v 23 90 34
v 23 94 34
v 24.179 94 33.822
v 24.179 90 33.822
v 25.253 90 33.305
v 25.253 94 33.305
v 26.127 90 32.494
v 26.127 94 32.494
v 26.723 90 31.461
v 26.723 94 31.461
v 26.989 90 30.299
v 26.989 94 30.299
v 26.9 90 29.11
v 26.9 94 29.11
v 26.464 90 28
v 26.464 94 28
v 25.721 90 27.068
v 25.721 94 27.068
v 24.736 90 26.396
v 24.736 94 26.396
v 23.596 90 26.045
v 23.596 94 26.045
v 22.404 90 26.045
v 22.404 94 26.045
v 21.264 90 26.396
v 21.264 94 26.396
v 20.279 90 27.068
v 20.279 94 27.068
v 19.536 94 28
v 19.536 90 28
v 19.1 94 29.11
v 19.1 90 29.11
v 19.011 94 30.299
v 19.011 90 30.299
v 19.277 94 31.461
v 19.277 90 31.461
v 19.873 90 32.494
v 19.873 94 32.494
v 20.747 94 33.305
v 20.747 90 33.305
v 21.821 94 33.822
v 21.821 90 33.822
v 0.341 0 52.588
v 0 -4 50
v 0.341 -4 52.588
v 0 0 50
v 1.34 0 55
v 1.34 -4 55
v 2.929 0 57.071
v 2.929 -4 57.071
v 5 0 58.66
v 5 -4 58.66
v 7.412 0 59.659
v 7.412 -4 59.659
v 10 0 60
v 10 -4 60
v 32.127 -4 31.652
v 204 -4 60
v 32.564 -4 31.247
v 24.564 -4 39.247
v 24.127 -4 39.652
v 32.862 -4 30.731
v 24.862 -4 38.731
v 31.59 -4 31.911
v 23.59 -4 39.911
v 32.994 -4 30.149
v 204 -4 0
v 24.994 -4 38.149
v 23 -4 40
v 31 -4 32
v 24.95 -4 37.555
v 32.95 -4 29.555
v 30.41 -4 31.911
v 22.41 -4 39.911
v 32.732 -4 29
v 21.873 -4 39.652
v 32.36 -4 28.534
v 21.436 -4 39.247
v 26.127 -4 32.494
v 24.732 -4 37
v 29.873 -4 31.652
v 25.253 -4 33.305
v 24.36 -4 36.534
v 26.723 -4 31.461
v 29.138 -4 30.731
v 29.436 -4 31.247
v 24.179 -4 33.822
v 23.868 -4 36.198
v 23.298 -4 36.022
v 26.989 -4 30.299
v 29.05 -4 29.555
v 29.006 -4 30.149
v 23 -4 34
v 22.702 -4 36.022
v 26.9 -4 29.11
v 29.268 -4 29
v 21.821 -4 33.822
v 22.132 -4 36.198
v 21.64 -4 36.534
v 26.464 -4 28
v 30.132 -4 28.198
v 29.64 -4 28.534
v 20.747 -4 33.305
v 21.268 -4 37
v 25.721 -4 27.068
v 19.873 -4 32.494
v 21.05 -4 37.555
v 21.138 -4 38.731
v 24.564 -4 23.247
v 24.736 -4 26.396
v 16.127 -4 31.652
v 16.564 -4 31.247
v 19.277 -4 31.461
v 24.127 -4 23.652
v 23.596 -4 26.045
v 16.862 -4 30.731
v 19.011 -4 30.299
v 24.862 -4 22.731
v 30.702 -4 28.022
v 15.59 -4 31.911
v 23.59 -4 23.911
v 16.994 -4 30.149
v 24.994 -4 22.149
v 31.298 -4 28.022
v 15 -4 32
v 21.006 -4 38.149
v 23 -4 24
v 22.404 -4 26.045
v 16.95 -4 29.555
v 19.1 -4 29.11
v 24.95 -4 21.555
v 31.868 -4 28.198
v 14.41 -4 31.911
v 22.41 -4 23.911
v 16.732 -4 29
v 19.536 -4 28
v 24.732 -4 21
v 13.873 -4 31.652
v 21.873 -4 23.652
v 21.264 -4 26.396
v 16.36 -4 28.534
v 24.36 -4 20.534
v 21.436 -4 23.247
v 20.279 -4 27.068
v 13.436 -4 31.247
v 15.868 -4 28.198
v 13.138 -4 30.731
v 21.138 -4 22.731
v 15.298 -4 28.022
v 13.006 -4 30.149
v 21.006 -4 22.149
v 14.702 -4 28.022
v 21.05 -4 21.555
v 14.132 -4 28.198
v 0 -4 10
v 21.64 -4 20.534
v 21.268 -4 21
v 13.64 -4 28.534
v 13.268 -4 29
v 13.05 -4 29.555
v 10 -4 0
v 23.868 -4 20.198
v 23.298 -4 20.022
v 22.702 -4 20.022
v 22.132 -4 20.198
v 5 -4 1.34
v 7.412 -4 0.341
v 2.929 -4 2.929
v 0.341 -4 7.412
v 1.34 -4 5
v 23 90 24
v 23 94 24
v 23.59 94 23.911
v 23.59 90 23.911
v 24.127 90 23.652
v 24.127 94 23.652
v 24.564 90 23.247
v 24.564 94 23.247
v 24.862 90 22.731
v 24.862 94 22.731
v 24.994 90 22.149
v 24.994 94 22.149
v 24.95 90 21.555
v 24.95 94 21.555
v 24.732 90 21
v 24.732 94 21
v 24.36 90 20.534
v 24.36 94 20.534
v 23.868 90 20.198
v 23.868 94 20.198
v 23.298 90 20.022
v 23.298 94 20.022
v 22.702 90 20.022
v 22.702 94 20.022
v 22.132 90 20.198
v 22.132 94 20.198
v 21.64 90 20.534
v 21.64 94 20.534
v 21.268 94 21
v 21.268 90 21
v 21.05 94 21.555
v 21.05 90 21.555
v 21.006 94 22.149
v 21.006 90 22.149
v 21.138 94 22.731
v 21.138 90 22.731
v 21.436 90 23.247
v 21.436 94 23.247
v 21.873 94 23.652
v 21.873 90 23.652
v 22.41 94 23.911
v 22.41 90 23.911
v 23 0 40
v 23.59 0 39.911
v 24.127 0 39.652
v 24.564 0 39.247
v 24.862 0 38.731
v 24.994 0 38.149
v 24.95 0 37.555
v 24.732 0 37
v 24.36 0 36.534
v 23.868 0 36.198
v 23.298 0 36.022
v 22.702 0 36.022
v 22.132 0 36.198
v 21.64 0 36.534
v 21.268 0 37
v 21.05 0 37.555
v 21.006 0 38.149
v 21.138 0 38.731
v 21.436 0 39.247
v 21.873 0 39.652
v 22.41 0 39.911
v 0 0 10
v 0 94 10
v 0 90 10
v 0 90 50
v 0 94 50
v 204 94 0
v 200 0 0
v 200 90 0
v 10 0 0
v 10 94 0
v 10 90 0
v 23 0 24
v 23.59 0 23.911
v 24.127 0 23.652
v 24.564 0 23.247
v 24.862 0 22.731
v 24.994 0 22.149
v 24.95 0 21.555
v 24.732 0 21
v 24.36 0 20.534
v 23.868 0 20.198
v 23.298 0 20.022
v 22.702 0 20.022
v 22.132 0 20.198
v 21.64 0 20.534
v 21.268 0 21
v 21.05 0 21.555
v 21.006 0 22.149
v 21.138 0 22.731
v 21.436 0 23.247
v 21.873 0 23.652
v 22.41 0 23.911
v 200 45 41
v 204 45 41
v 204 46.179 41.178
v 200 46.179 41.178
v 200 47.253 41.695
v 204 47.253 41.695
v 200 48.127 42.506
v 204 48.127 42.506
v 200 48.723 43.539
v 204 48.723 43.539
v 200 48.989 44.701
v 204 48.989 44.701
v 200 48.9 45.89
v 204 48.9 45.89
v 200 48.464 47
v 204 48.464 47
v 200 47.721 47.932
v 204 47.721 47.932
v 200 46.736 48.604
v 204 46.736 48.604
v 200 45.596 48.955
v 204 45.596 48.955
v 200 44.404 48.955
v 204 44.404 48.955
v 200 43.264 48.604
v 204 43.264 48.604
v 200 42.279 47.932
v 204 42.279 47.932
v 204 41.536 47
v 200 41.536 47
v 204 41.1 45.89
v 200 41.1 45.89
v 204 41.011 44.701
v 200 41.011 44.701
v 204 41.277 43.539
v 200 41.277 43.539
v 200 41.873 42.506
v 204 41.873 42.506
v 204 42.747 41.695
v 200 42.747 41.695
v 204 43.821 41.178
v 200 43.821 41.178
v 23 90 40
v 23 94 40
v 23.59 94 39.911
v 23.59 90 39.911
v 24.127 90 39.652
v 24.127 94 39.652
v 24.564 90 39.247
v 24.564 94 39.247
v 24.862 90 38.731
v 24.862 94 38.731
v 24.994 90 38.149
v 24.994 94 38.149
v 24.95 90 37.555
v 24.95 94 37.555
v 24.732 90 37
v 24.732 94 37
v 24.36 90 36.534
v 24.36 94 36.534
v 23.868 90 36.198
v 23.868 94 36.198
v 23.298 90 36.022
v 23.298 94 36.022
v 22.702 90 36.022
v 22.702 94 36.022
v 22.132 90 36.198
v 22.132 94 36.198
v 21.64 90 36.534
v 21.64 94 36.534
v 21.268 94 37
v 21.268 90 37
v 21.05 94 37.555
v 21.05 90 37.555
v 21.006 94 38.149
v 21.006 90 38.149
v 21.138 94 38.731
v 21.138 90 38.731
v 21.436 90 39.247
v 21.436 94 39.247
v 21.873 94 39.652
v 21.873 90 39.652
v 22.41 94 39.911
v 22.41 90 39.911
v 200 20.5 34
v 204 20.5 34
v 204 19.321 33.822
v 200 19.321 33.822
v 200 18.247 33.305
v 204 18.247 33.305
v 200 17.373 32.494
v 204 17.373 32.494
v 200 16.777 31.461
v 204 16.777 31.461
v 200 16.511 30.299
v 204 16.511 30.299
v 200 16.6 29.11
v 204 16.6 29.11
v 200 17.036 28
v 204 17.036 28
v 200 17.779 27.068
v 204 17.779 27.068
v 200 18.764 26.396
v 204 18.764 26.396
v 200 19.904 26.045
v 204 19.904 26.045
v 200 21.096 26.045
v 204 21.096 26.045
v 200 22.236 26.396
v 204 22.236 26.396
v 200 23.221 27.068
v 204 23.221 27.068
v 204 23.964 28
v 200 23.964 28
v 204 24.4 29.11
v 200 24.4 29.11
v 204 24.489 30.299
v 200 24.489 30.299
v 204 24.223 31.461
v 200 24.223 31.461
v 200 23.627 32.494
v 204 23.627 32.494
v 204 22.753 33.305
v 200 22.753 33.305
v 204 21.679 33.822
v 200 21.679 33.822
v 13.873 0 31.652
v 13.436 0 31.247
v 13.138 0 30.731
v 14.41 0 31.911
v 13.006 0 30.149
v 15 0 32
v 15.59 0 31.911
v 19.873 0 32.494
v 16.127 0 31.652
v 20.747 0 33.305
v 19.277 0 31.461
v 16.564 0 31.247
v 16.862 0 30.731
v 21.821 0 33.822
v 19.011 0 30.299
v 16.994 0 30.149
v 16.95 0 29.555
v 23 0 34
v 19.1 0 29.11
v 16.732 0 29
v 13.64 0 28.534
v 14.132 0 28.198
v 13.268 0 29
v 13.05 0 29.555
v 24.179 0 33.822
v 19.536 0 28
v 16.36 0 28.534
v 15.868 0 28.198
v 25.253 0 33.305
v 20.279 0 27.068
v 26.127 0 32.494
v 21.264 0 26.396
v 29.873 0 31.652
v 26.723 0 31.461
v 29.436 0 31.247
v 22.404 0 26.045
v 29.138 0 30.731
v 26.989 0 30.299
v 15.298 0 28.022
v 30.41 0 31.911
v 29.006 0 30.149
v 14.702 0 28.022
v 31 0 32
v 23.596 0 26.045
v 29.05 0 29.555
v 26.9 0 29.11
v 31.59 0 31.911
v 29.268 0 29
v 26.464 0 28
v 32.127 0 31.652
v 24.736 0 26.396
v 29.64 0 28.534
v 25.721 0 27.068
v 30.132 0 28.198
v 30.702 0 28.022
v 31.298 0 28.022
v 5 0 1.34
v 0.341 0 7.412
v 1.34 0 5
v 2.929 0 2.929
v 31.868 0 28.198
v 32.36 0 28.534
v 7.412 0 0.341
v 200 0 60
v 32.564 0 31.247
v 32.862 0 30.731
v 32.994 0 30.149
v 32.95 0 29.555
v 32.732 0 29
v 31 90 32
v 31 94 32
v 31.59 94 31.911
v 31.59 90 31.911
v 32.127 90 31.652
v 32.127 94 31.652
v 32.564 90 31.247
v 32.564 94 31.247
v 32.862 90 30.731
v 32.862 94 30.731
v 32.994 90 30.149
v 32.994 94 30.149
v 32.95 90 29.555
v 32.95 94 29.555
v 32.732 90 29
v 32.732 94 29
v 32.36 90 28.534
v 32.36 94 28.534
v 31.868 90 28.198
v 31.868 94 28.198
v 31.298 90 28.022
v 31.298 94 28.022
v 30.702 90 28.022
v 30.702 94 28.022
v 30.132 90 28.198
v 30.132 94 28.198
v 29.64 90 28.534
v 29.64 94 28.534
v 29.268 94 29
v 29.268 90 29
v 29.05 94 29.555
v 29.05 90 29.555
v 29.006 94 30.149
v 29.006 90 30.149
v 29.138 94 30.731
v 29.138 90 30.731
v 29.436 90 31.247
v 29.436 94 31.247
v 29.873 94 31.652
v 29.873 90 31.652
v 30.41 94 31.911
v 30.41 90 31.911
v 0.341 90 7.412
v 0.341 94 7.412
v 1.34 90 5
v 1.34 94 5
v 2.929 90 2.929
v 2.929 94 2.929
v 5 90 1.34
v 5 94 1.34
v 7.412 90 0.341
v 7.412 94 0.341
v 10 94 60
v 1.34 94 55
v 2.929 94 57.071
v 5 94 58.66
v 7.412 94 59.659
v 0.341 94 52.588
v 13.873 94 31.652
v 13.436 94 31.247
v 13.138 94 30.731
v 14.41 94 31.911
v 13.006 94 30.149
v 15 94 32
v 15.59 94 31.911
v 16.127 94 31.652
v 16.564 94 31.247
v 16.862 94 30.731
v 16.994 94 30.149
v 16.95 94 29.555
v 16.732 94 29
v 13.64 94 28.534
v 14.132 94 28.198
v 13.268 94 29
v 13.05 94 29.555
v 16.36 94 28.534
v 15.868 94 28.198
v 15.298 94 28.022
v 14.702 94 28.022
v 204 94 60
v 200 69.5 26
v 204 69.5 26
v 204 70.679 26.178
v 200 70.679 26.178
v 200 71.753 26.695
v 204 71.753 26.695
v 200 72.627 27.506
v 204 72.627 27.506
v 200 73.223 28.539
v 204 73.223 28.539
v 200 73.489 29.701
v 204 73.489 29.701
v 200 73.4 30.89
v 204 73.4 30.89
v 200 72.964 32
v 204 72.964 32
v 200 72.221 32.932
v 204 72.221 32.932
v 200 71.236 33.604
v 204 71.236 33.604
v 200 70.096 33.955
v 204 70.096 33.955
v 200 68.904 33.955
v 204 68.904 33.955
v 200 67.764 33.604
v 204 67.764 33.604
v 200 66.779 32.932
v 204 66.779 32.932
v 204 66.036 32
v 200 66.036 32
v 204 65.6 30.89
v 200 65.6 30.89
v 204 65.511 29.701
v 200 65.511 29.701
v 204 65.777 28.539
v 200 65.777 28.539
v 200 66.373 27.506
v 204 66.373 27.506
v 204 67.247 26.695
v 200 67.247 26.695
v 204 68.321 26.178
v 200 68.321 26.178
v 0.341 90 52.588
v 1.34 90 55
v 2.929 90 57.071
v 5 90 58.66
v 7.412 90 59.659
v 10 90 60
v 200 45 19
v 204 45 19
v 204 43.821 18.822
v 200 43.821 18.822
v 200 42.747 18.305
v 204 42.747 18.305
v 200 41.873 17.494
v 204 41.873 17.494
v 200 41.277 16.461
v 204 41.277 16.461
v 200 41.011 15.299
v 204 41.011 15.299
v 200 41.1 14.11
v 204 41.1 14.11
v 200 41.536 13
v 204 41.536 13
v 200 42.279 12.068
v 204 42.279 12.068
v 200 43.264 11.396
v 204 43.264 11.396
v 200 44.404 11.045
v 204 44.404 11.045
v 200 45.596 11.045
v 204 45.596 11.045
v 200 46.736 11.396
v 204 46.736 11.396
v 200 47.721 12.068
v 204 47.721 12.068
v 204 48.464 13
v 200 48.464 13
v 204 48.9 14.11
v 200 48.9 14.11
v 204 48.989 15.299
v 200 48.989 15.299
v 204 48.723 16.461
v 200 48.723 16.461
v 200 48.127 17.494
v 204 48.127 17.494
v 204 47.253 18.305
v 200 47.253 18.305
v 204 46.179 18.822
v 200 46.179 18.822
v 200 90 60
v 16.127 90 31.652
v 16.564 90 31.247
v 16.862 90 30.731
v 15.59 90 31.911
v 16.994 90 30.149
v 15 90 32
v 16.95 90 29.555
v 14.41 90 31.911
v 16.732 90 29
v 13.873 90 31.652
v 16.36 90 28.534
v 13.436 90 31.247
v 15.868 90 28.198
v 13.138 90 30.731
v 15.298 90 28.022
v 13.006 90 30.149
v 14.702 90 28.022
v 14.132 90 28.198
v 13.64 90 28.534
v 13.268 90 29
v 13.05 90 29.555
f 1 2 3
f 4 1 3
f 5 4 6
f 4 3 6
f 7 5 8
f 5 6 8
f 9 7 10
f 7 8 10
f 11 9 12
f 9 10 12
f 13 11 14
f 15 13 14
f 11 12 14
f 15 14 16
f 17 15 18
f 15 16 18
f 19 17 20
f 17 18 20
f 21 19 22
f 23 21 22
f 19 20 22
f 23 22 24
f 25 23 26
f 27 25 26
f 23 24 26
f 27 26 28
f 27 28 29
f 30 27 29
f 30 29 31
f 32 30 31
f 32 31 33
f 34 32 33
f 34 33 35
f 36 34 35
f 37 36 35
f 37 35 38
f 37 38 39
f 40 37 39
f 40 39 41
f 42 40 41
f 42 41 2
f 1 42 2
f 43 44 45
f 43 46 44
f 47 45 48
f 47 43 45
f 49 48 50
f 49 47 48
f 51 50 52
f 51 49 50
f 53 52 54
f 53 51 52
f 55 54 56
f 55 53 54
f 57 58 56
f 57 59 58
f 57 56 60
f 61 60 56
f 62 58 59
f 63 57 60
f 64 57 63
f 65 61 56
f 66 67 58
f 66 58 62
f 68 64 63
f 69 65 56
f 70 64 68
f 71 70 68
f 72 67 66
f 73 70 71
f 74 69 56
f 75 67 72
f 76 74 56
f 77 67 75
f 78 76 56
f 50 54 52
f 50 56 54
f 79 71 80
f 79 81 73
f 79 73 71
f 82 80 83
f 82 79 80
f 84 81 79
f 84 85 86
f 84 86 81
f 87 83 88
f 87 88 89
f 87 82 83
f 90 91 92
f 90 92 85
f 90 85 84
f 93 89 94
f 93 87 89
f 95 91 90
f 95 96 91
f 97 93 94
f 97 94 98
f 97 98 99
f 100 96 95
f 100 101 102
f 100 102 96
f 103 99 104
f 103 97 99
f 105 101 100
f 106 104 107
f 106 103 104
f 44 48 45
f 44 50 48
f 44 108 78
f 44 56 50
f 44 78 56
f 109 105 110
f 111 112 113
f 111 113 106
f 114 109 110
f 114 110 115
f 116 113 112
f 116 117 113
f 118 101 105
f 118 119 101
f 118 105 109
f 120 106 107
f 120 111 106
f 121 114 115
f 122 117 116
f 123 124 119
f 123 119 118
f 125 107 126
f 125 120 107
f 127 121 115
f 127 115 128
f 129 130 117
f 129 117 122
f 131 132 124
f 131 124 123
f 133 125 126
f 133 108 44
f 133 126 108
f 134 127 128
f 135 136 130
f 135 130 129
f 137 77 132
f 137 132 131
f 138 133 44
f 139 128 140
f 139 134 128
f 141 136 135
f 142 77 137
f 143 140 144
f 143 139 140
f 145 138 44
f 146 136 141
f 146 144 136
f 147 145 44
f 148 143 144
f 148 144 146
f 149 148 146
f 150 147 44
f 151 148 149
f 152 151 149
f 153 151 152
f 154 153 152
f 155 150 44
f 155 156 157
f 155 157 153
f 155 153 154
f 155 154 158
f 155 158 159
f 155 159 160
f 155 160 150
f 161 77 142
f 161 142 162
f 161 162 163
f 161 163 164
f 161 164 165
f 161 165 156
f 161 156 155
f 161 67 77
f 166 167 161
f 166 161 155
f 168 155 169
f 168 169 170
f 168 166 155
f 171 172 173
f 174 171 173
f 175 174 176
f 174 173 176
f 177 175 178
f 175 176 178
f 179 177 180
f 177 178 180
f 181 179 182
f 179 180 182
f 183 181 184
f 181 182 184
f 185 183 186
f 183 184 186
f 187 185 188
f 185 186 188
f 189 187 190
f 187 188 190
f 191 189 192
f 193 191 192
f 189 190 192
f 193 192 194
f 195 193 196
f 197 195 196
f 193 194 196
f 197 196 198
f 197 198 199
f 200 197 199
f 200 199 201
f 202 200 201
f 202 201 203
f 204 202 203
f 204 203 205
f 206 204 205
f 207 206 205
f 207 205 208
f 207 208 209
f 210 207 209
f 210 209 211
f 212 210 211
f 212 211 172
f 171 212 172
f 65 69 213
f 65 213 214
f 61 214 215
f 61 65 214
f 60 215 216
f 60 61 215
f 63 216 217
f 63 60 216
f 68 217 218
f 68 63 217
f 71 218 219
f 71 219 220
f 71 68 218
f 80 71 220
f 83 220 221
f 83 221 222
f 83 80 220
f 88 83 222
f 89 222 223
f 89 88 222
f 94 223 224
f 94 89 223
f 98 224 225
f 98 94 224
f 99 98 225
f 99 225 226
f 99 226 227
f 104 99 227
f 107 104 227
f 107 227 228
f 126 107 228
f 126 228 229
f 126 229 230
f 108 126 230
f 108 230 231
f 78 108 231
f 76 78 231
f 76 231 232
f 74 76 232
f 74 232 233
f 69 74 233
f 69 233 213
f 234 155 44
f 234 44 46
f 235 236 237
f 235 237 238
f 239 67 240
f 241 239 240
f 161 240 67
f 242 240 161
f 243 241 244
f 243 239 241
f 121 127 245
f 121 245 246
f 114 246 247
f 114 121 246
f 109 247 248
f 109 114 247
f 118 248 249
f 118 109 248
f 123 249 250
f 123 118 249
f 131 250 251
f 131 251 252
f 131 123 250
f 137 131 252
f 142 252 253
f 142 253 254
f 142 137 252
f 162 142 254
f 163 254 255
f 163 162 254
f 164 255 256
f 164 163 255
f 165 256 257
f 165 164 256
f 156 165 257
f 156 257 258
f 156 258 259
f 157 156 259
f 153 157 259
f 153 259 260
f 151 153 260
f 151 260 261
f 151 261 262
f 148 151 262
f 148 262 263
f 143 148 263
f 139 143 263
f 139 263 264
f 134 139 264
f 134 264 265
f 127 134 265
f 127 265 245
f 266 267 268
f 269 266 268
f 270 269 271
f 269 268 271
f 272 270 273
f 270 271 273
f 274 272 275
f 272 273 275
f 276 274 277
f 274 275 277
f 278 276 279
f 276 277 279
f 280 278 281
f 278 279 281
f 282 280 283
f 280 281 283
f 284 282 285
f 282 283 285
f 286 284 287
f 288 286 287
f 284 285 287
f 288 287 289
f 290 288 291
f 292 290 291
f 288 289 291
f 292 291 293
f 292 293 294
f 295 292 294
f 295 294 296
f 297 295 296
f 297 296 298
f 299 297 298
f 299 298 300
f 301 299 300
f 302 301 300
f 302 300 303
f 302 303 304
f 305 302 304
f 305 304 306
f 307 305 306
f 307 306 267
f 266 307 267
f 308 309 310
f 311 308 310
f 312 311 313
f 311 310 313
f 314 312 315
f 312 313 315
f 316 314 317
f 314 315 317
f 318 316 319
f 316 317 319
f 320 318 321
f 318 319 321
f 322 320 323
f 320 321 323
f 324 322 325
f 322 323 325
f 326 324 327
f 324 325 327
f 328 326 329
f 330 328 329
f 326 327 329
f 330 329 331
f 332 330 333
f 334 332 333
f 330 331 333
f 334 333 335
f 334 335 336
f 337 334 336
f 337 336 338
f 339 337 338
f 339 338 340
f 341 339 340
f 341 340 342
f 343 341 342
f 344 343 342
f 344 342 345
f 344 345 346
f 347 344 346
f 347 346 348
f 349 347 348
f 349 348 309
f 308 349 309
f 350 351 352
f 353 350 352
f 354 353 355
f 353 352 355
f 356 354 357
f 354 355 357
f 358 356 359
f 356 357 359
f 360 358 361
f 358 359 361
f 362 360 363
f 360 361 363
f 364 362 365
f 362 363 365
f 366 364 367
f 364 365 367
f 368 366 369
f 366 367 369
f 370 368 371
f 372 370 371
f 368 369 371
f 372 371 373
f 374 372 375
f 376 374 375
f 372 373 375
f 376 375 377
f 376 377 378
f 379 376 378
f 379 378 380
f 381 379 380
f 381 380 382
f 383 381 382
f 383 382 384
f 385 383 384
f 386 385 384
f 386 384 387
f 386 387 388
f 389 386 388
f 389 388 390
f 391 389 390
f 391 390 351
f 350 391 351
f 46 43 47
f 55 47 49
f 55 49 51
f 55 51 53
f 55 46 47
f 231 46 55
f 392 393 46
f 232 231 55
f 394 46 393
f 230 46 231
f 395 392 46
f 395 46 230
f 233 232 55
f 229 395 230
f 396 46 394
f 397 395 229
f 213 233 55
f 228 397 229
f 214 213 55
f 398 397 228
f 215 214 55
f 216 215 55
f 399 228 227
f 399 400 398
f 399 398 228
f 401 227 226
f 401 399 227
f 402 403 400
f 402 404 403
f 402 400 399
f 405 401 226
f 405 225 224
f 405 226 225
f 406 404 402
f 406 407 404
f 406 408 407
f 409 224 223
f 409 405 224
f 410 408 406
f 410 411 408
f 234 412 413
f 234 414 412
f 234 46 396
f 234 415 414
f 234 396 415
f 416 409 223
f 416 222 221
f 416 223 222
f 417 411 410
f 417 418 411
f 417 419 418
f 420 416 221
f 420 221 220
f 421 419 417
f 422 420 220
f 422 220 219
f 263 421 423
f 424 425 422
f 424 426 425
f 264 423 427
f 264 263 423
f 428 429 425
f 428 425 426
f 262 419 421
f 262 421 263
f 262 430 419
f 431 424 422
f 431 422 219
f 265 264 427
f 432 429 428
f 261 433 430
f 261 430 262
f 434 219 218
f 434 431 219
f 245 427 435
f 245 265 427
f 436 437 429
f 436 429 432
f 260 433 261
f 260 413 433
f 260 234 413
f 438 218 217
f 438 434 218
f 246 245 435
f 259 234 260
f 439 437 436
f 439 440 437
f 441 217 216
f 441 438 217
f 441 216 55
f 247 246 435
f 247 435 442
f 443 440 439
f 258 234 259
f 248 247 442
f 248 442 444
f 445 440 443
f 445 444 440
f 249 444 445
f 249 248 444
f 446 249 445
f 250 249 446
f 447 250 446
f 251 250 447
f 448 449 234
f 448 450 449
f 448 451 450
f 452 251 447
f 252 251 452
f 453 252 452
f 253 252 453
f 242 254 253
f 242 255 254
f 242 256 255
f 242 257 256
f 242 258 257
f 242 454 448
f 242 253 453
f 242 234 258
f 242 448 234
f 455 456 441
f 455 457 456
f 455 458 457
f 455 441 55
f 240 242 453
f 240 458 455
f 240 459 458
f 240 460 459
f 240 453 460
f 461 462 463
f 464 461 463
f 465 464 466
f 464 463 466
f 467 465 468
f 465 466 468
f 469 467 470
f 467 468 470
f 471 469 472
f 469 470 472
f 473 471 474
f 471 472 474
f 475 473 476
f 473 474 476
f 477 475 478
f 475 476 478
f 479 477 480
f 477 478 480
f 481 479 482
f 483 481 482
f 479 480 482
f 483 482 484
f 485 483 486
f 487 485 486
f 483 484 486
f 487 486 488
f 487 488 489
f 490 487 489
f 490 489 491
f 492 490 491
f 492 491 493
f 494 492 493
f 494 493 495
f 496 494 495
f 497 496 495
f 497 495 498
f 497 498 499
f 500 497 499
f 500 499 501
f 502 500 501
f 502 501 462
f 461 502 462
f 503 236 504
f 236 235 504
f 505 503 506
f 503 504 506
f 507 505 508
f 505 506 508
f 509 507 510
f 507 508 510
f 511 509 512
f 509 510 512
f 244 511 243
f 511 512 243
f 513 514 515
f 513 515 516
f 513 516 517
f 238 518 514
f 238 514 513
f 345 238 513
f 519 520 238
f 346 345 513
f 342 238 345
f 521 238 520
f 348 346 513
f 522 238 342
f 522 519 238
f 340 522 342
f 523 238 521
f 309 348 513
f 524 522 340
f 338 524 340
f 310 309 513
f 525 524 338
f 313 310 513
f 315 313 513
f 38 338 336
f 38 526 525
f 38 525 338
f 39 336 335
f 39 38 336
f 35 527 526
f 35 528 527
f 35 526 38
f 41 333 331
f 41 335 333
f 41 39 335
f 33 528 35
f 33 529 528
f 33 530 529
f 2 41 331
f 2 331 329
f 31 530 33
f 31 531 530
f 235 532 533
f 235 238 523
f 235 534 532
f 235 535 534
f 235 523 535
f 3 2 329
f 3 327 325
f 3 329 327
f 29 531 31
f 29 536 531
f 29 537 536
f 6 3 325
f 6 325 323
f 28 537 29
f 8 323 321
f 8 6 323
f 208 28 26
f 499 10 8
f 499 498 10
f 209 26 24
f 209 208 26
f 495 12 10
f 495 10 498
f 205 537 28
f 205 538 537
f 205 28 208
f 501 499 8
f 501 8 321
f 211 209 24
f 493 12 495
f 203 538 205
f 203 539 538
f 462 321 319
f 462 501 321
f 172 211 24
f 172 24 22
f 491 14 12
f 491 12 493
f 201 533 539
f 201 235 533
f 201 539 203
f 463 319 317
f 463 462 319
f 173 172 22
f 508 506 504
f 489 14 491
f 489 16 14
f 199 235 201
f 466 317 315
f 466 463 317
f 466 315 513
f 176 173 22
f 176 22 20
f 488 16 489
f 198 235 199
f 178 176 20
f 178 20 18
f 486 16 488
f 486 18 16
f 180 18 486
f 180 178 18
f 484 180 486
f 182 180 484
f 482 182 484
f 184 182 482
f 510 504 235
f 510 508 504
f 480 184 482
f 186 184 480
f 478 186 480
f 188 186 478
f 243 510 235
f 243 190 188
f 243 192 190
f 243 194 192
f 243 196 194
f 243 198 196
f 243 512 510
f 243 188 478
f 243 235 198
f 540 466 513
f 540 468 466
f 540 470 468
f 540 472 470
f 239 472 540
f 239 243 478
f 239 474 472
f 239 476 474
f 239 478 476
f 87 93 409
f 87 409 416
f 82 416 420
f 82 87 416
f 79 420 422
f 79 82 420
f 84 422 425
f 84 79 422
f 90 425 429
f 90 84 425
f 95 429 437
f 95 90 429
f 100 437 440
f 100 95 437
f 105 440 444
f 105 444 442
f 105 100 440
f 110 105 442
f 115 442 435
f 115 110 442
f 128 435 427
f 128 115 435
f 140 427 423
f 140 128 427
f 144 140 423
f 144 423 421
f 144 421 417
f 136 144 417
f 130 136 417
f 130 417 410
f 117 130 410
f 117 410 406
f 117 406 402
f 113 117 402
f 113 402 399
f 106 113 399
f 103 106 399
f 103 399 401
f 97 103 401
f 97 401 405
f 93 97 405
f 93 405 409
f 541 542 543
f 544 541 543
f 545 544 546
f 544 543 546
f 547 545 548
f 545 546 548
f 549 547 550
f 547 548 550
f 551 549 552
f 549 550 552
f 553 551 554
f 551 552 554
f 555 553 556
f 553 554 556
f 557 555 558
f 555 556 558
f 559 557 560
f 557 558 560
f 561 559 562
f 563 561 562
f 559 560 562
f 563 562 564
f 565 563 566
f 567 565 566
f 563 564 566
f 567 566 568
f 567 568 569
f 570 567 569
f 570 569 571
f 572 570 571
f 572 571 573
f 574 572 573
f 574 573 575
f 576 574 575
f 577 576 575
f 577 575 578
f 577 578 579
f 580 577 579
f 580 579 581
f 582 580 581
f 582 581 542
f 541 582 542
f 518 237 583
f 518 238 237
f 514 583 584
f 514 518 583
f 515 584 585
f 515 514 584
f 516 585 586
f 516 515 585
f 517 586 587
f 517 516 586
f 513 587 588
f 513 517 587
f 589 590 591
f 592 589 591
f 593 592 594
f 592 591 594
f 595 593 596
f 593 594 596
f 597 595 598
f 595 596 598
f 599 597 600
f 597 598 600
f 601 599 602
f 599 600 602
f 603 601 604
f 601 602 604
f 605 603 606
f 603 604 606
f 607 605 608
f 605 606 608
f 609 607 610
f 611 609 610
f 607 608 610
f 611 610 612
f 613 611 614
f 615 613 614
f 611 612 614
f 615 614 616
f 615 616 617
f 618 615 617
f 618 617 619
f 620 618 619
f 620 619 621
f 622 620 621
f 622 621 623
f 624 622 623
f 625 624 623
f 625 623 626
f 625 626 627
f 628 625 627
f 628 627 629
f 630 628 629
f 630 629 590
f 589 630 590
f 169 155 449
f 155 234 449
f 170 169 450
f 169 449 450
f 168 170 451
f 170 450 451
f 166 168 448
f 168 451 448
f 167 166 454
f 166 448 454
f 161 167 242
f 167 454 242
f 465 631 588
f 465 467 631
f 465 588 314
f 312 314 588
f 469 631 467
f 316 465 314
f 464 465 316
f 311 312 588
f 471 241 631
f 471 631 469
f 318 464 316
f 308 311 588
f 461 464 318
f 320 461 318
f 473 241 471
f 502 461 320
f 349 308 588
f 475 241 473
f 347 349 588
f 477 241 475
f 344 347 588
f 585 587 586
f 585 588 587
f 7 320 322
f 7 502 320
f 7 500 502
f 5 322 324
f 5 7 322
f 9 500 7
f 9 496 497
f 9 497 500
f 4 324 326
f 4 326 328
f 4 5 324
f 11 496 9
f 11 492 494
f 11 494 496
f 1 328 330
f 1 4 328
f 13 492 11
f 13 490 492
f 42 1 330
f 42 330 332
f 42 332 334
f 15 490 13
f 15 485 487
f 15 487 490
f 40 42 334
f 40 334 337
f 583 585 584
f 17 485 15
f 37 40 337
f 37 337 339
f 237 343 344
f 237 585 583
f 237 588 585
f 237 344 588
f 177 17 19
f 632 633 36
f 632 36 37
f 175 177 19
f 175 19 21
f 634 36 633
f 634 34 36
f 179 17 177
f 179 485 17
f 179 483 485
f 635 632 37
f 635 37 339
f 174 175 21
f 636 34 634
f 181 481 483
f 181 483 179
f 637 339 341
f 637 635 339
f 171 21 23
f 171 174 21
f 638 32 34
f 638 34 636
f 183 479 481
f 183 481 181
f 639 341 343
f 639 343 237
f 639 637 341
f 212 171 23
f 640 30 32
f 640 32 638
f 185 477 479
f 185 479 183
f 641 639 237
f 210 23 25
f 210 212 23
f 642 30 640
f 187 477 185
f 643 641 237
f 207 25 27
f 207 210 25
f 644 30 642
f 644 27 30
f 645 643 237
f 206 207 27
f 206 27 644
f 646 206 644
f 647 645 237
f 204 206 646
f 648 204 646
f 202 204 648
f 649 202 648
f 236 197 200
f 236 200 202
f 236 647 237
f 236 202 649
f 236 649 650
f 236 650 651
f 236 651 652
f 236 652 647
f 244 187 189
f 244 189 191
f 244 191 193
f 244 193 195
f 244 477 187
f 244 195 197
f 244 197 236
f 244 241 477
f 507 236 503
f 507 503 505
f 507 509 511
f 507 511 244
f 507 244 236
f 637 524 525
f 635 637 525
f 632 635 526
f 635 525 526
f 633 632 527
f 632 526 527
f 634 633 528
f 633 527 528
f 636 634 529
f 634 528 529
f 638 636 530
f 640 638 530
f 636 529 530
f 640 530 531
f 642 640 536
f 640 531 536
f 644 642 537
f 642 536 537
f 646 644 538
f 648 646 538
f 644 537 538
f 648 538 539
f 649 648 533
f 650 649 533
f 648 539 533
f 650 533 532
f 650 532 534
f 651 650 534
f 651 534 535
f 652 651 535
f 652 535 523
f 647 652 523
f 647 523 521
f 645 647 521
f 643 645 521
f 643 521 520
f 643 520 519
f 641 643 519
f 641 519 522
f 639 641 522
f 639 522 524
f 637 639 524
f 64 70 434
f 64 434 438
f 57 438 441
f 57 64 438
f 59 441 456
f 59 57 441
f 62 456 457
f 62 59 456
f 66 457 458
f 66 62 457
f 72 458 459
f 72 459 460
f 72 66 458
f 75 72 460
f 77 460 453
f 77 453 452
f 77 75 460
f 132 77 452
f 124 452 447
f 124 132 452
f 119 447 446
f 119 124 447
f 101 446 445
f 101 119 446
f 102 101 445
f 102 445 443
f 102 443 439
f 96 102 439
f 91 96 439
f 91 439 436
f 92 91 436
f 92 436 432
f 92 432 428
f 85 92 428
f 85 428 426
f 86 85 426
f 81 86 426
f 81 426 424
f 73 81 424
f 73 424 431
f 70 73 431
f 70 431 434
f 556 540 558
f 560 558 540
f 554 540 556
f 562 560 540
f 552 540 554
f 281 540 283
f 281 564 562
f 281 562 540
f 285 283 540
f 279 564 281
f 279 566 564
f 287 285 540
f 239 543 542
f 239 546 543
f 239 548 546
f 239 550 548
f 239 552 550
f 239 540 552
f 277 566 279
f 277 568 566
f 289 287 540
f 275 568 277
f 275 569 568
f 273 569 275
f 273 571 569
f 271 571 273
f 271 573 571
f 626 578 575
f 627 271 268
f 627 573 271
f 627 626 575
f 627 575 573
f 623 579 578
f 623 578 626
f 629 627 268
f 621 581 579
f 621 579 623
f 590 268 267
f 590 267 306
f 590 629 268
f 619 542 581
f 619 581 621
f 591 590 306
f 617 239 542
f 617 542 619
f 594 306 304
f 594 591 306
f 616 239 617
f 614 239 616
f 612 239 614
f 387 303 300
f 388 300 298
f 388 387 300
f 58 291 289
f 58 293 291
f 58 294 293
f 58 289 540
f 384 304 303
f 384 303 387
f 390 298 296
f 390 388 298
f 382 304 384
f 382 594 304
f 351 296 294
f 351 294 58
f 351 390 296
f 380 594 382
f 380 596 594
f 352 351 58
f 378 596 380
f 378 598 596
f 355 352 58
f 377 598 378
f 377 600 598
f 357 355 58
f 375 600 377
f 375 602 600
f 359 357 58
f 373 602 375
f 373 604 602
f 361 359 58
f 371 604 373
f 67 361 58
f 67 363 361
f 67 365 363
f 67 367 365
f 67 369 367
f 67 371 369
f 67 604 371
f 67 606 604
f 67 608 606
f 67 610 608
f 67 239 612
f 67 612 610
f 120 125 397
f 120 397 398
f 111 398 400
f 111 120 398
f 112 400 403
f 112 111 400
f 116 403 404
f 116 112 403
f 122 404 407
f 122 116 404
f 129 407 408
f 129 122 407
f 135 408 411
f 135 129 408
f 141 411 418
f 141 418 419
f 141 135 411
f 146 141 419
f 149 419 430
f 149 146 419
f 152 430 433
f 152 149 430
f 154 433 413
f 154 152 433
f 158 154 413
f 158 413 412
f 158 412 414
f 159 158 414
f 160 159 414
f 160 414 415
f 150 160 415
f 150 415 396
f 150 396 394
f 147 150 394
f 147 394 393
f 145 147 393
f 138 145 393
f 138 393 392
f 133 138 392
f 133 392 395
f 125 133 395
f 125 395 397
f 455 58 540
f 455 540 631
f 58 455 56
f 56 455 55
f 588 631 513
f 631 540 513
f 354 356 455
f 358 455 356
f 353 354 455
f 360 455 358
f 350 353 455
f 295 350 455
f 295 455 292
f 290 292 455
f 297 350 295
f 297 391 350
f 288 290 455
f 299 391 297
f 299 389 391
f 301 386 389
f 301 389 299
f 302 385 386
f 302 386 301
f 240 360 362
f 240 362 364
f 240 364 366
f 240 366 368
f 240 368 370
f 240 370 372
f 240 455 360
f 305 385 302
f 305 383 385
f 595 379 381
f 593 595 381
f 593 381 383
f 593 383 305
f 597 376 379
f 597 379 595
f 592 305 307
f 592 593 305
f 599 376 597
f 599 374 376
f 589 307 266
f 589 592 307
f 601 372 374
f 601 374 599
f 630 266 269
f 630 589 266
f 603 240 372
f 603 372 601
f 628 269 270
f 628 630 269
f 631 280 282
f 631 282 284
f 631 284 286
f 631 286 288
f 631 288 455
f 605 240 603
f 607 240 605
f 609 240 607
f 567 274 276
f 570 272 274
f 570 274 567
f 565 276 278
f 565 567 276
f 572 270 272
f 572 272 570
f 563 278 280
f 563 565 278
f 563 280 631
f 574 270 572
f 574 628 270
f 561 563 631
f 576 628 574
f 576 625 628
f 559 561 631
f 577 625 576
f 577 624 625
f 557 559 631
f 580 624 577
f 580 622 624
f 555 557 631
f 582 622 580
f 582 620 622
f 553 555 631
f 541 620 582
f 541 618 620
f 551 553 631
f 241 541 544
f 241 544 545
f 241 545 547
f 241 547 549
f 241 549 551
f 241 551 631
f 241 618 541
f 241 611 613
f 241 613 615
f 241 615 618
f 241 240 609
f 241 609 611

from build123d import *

# Parameters (mm, degrees)
EKSTR_ZYON_NCE1_DEPTH = 60
RADYUS1_R             = 10
KES_EKSTR_ZYON1_REACH = 236.137
IZIM2_R               = 4
IZIM2_R_2             = 2
KES_EKSTR_ZYON2_REACH = 234.491
IZIM3_R               = 4


with BuildPart() as part:
    # Çizim1 → Ekstrüzyon-İnce1 (new body)
    with BuildSketch(Plane.XY):
        Polygon((0, 0), (200, 0), (200, 90), (0, 90), (0, 94), (204, 94), (204, -4), (0, -4), align=None)
    extrude(amount=EKSTR_ZYON_NCE1_DEPTH)

    # Radyus1
    radyus1_edges = [part.edges().sort_by_distance(p)[0] for p in [
        (0, -2, 60),
        (0, 92, 60),
        (0, -2, 0),
        (0, 92, 0),
    ]]
    fillet(radyus1_edges, radius=RADYUS1_R)

    # Çizim2 → Kes-Ekstrüzyon1 (cut, up to next)
    with BuildSketch(Plane(origin=(0, 94, 0), x_dir=(1, 0, 0), z_dir=(0, 1, 0)), mode=Mode.PRIVATE) as kes_ekstr_zyon1_sk1:
        with Locations(Location((23, -30, 0), (0, 0, 270))):
            Circle(IZIM2_R)
    kes_ekstr_zyon1_tool1 = extrude(kes_ekstr_zyon1_sk1.sketch, amount=-KES_EKSTR_ZYON1_REACH, mode=Mode.PRIVATE) & part.part
    # Çizim2 → Kes-Ekstrüzyon1 (cut, up to next)
    with BuildSketch(Plane(origin=(0, 94, 0), x_dir=(1, 0, 0), z_dir=(0, 1, 0)), mode=Mode.PRIVATE) as kes_ekstr_zyon1_sk2:
        with Locations(Location((23, -22, 0), (0, 0, 270))):
            Circle(IZIM2_R_2)
    kes_ekstr_zyon1_tool2 = extrude(kes_ekstr_zyon1_sk2.sketch, amount=-KES_EKSTR_ZYON1_REACH, mode=Mode.PRIVATE) & part.part
    # Çizim2 → Kes-Ekstrüzyon1 (cut, up to next)
    with BuildSketch(Plane(origin=(0, 94, 0), x_dir=(1, 0, 0), z_dir=(0, 1, 0)), mode=Mode.PRIVATE) as kes_ekstr_zyon1_sk3:
        with Locations(Location((23, -38, 0), (0, 0, 270))):
            Circle(IZIM2_R_2)
    kes_ekstr_zyon1_tool3 = extrude(kes_ekstr_zyon1_sk3.sketch, amount=-KES_EKSTR_ZYON1_REACH, mode=Mode.PRIVATE) & part.part
    # Çizim2 → Kes-Ekstrüzyon1 (cut, up to next)
    with BuildSketch(Plane(origin=(0, 94, 0), x_dir=(1, 0, 0), z_dir=(0, 1, 0)), mode=Mode.PRIVATE) as kes_ekstr_zyon1_sk4:
        with Locations(Location((31, -30, 0), (0, 0, 270))):
            Circle(IZIM2_R_2)
    kes_ekstr_zyon1_tool4 = extrude(kes_ekstr_zyon1_sk4.sketch, amount=-KES_EKSTR_ZYON1_REACH, mode=Mode.PRIVATE) & part.part
    # Çizim2 → Kes-Ekstrüzyon1 (cut, up to next)
    with BuildSketch(Plane(origin=(0, 94, 0), x_dir=(1, 0, 0), z_dir=(0, 1, 0)), mode=Mode.PRIVATE) as kes_ekstr_zyon1_sk5:
        with Locations(Location((15, -30, 0), (0, 0, 270))):
            Circle(IZIM2_R_2)
    kes_ekstr_zyon1_tool5 = extrude(kes_ekstr_zyon1_sk5.sketch, amount=-KES_EKSTR_ZYON1_REACH, mode=Mode.PRIVATE) & part.part
    kes_ekstr_zyon1_1 = kes_ekstr_zyon1_tool1.solids().sort_by_distance((23, 94, 30))[0]
    add(kes_ekstr_zyon1_1, mode=Mode.SUBTRACT)
    kes_ekstr_zyon1_2 = kes_ekstr_zyon1_tool2.solids().sort_by_distance((23, 94, 22))[0]
    add(kes_ekstr_zyon1_2, mode=Mode.SUBTRACT)
    kes_ekstr_zyon1_3 = kes_ekstr_zyon1_tool3.solids().sort_by_distance((23, 94, 38))[0]
    add(kes_ekstr_zyon1_3, mode=Mode.SUBTRACT)
    kes_ekstr_zyon1_4 = kes_ekstr_zyon1_tool4.solids().sort_by_distance((31, 94, 30))[0]
    add(kes_ekstr_zyon1_4, mode=Mode.SUBTRACT)
    kes_ekstr_zyon1_5 = kes_ekstr_zyon1_tool5.solids().sort_by_distance((15, 94, 30))[0]
    add(kes_ekstr_zyon1_5, mode=Mode.SUBTRACT)
    kes_ekstr_zyon1 = kes_ekstr_zyon1_1 + kes_ekstr_zyon1_2 + kes_ekstr_zyon1_3 + kes_ekstr_zyon1_4 + kes_ekstr_zyon1_5  # Kes-Ekstrüzyon1 as one shape, for the pattern or mirror that repeats it

    # Aynalama1: Kes-Ekstrüzyon1 across plane
    add(kes_ekstr_zyon1.mirror(Plane.ZX.offset(45)), mode=Mode.SUBTRACT)

    # Çizim3 → Kes-Ekstrüzyon2 (cut, up to next)
    with BuildSketch(Plane(origin=(204, 0, 0), x_dir=(0, 0, -1), z_dir=(1, 0, 0)), mode=Mode.PRIVATE) as kes_ekstr_zyon2_sk1:
        with Locations((-30, 69.5)):
            Circle(IZIM3_R)
    kes_ekstr_zyon2_tool1 = extrude(kes_ekstr_zyon2_sk1.sketch, amount=-KES_EKSTR_ZYON2_REACH, mode=Mode.PRIVATE) & part.part
    # Çizim3 → Kes-Ekstrüzyon2 (cut, up to next)
    with BuildSketch(Plane(origin=(204, 0, 0), x_dir=(0, 0, -1), z_dir=(1, 0, 0)), mode=Mode.PRIVATE) as kes_ekstr_zyon2_sk2:
        with Locations((-45, 45)):
            Circle(IZIM3_R)
    kes_ekstr_zyon2_tool2 = extrude(kes_ekstr_zyon2_sk2.sketch, amount=-KES_EKSTR_ZYON2_REACH, mode=Mode.PRIVATE) & part.part
    # Çizim3 → Kes-Ekstrüzyon2 (cut, up to next)
    with BuildSketch(Plane(origin=(204, 0, 0), x_dir=(0, 0, -1), z_dir=(1, 0, 0)), mode=Mode.PRIVATE) as kes_ekstr_zyon2_sk3:
        with Locations(Location((-15, 45, 0), (0, 0, 180))):
            Circle(IZIM3_R)
    kes_ekstr_zyon2_tool3 = extrude(kes_ekstr_zyon2_sk3.sketch, amount=-KES_EKSTR_ZYON2_REACH, mode=Mode.PRIVATE) & part.part
    # Çizim3 → Kes-Ekstrüzyon2 (cut, up to next)
    with BuildSketch(Plane(origin=(204, 0, 0), x_dir=(0, 0, -1), z_dir=(1, 0, 0)), mode=Mode.PRIVATE) as kes_ekstr_zyon2_sk4:
        with Locations(Location((-30, 20.5, 0), (0, 0, 180))):
            Circle(IZIM3_R)
    kes_ekstr_zyon2_tool4 = extrude(kes_ekstr_zyon2_sk4.sketch, amount=-KES_EKSTR_ZYON2_REACH, mode=Mode.PRIVATE) & part.part
    add(kes_ekstr_zyon2_tool1.solids().sort_by_distance((204, 69.5, 30))[0], mode=Mode.SUBTRACT)
    add(kes_ekstr_zyon2_tool2.solids().sort_by_distance((204, 45, 45))[0], mode=Mode.SUBTRACT)
    add(kes_ekstr_zyon2_tool3.solids().sort_by_distance((204, 45, 15))[0], mode=Mode.SUBTRACT)
    add(kes_ekstr_zyon2_tool4.solids().sort_by_distance((204, 20.5, 30))[0], mode=Mode.SUBTRACT)


solid = part.part
